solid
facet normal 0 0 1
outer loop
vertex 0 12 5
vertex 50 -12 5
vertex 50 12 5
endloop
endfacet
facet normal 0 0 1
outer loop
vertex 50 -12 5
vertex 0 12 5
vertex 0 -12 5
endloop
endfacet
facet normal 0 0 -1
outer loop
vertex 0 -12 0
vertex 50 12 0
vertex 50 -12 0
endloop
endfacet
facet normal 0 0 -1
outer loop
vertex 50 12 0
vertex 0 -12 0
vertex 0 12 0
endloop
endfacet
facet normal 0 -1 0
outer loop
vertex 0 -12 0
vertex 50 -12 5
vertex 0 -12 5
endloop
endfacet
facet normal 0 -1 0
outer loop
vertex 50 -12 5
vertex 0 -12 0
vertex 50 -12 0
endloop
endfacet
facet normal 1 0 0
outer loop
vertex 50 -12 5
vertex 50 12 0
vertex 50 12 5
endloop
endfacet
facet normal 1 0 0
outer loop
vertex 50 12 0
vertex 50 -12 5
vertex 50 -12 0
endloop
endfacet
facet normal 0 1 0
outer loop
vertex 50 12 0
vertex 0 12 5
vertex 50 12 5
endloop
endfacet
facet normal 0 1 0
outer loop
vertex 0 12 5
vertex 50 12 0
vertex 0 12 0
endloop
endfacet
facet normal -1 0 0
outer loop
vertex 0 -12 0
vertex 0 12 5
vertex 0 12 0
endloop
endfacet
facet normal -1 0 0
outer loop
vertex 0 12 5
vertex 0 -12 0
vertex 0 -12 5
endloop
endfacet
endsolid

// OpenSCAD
// file: Library/center.scad
module center(axis){
	translate((axis / -2.0)){
		children();
	}
}
// main file
use <Library/center.scad>

//Length, width, height.
dimensions = [50, 24, 5];

module CylinderDispenser_Dispenser_Hearth_Outer_Walkway(dimensions){
	center([0, dimensions[1], 0]){
		cube(dimensions);
	}
}

CylinderDispenser_Dispenser_Hearth_Outer_Walkway(dimensions);
